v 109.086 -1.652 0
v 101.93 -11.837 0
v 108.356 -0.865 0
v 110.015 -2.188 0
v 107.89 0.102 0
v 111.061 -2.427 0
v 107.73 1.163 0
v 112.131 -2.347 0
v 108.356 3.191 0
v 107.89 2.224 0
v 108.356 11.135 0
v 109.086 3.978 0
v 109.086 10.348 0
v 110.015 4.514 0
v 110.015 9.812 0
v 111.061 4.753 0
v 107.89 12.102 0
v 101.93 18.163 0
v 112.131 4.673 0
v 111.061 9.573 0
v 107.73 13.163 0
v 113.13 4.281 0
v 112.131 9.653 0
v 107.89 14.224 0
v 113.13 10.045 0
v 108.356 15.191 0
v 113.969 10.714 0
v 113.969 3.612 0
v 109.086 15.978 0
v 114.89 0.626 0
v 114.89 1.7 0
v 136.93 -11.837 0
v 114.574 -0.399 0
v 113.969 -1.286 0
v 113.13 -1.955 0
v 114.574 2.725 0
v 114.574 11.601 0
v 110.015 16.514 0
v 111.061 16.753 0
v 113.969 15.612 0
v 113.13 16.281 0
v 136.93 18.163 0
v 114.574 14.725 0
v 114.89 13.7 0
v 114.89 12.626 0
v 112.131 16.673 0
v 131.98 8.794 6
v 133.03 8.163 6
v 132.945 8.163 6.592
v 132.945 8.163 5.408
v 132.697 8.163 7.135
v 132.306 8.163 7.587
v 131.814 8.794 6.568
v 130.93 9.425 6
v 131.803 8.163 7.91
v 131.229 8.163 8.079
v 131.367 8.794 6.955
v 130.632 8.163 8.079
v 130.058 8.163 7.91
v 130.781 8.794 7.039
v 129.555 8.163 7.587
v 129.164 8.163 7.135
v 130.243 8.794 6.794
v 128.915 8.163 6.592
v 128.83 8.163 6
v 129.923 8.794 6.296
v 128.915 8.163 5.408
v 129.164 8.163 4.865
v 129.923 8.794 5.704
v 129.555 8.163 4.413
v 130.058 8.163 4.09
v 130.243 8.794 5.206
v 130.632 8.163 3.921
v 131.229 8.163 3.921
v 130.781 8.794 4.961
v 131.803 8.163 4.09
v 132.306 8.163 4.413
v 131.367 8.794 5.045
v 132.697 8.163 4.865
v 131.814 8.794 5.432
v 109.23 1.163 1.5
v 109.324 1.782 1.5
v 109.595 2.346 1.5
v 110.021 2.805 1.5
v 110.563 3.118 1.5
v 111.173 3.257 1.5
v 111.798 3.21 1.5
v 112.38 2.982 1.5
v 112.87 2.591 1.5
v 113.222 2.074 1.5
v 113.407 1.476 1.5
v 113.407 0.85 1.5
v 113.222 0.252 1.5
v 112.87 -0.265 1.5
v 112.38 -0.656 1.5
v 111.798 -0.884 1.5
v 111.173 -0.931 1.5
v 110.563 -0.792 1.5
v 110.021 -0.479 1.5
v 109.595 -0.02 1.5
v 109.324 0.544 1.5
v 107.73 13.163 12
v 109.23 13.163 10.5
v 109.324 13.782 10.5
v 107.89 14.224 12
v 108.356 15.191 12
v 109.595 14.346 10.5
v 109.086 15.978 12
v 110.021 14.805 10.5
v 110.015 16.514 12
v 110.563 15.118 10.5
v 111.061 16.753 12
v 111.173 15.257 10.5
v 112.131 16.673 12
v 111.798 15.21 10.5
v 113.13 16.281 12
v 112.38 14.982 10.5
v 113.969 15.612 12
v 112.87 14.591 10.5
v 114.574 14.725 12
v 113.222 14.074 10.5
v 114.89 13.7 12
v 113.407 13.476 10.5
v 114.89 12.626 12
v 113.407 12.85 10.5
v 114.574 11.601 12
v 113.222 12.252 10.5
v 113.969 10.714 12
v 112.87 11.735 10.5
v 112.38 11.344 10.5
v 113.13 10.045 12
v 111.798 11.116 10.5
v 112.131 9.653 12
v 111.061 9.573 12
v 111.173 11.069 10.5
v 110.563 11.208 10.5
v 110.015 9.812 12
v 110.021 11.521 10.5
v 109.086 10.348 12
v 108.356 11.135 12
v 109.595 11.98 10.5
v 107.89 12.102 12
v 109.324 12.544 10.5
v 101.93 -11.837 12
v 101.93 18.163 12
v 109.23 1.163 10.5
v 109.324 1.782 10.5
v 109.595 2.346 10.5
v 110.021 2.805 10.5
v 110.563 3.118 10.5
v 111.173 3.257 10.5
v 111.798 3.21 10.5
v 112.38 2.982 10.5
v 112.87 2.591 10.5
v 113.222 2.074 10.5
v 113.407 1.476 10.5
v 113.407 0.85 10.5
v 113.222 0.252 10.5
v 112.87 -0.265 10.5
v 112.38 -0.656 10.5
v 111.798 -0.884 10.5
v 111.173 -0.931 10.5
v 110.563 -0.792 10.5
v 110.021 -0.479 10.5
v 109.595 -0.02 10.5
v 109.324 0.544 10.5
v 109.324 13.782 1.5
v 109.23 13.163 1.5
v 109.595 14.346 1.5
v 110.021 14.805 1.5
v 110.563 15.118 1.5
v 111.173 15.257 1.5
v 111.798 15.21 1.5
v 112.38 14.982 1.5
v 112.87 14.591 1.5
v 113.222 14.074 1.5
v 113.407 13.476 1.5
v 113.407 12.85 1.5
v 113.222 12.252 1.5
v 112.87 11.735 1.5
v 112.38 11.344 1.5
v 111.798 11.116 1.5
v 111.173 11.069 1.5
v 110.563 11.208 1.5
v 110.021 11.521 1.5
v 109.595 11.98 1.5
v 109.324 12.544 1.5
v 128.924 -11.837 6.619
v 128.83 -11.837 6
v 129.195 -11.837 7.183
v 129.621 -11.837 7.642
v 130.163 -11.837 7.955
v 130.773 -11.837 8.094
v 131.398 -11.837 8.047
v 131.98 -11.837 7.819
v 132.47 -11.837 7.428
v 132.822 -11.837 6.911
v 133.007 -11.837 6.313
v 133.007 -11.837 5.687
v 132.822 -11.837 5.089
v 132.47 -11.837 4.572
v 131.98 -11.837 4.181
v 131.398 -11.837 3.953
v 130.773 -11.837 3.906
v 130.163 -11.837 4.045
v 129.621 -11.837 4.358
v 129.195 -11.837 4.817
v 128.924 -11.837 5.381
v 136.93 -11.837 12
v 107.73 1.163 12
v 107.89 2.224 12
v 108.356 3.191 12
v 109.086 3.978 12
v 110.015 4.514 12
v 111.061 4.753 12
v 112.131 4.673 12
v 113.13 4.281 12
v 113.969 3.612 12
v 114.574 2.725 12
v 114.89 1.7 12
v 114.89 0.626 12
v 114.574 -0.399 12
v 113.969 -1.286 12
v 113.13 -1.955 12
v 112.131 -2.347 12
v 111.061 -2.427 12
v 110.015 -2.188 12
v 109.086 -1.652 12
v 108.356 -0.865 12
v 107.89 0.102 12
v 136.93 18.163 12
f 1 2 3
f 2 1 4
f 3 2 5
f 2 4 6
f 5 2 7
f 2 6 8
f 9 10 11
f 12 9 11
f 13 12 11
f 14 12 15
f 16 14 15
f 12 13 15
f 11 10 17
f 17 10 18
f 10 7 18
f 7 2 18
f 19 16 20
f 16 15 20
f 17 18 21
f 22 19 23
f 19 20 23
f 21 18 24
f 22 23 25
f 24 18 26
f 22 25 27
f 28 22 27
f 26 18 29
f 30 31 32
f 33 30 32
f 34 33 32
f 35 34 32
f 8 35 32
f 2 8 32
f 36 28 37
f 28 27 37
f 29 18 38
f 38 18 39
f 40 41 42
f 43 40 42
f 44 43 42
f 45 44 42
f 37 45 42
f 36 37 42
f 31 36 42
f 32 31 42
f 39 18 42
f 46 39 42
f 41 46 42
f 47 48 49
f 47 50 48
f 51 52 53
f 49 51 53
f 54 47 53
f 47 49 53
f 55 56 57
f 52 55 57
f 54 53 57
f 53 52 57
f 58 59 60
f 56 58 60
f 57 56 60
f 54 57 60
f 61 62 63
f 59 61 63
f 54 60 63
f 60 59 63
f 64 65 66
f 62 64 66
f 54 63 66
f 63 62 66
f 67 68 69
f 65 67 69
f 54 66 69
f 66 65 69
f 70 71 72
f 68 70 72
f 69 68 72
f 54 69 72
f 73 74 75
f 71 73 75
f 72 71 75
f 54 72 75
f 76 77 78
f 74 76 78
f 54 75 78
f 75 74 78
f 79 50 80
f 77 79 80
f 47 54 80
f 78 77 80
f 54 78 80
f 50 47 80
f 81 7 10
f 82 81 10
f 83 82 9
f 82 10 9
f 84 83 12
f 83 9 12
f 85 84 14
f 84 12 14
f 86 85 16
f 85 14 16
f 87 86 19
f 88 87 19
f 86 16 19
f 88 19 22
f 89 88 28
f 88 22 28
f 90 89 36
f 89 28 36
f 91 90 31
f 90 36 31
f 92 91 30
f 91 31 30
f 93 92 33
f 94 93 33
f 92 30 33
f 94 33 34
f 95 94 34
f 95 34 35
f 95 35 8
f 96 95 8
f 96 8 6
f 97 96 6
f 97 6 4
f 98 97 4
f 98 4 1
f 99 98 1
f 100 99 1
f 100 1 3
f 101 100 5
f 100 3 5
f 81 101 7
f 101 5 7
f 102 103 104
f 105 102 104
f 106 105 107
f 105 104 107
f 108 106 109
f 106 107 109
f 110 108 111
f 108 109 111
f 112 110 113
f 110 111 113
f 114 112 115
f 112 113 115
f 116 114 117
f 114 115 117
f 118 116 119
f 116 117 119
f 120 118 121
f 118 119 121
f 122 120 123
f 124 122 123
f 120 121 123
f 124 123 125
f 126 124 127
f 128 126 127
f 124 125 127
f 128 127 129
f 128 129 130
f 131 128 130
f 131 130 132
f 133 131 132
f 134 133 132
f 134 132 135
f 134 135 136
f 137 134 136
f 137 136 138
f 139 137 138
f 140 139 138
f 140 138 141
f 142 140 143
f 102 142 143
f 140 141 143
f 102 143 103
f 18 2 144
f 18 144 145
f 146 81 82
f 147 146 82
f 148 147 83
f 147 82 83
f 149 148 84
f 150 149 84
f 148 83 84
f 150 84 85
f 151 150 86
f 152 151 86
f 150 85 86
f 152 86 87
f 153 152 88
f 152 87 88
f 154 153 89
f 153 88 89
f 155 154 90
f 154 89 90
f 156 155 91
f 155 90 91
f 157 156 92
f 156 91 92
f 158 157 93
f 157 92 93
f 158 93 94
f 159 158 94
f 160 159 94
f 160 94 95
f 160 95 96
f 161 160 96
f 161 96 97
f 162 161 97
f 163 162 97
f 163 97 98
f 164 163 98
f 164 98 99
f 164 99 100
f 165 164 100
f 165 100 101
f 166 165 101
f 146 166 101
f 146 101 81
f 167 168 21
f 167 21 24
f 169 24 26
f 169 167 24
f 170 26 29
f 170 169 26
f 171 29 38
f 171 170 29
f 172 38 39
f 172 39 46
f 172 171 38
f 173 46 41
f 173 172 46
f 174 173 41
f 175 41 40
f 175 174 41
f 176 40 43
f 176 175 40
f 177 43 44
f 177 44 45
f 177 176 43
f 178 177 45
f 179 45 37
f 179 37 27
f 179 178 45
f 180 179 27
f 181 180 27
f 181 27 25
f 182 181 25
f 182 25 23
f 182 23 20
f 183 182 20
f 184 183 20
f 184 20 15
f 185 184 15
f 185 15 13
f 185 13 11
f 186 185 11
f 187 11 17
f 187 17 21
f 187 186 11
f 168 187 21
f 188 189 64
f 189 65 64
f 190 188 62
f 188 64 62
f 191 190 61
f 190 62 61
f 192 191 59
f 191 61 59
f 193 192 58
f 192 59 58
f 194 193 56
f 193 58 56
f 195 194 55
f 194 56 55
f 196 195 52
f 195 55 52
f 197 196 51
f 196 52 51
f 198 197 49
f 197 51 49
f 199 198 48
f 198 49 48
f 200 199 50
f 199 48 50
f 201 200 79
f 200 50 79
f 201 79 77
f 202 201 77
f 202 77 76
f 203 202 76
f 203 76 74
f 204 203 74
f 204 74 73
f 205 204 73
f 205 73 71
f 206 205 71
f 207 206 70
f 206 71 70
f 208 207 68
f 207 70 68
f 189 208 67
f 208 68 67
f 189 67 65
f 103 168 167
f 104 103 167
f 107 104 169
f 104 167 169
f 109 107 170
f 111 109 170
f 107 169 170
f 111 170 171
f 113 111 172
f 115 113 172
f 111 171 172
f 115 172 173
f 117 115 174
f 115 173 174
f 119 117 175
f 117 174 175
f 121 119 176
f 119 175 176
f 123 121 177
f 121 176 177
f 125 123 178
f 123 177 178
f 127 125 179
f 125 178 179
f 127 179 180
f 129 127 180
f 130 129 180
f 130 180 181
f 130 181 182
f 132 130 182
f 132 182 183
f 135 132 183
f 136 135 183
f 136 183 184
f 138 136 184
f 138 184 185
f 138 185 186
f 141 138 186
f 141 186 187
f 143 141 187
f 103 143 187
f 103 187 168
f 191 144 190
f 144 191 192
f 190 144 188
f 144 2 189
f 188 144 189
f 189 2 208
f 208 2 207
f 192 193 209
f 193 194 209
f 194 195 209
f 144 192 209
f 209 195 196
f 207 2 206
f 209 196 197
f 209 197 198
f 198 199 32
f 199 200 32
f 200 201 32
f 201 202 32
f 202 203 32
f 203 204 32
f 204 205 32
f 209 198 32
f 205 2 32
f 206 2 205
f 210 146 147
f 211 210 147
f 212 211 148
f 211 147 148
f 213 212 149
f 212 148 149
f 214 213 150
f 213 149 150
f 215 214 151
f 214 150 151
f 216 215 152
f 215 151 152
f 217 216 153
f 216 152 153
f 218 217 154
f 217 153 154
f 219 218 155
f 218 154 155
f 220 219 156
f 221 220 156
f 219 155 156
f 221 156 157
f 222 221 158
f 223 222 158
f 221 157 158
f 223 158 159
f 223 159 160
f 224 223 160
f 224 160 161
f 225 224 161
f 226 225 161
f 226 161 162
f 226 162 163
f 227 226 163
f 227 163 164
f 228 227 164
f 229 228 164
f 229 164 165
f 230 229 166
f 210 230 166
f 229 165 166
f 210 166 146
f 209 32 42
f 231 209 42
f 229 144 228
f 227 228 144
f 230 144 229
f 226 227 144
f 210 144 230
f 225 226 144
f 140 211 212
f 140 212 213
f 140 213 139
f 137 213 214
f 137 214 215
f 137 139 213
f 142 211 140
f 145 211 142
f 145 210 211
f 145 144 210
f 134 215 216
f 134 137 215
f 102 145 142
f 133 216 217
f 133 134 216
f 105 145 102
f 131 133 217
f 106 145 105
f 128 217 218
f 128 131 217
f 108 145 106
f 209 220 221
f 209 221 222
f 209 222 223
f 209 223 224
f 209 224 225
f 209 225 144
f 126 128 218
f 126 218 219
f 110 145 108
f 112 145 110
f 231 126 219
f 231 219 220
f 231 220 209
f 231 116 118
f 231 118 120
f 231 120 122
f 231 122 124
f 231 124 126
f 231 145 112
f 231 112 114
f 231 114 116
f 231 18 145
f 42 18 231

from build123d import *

# Parameters (mm, degrees)
ESBO_O2_W                                    = 35
ESBO_O2_H                                    = 30
RESSALTO_EXTRUS_O1_DEPTH                     = 12
BROCA_DE_ROSQUEAR_PARA_TARRAXA_DE_M5X0_8_D   = 4.2
BROCA_DE_ROSQUEAR_PARA_TARRAXA_DE_M5_2_D     = 4.2
BROCA_DE_ROSQUEAR_PARA_TARRAXA_DE_M5_2_DEPTH = 20
BROCA_DE_ROSQUEAR_PARA_TARRAXA_DE_M5_2_TIP   = 1.2618073
CHANFRO1_SIZE                                = 1.5
CHANFRO2_SIZE                                = 1.5
CHANFRO3_SIZE                                = 1.5


with BuildPart() as part:
    # Esboço2 → Ressalto-extrusão1 (new body)
    with BuildSketch(Plane.XY):
        with Locations((119.430382681, 3.163019551)):
            Rectangle(ESBO_O2_W, ESBO_O2_H)
    extrude(amount=RESSALTO_EXTRUS_O1_DEPTH)

    # Broca de rosquear para tarraxa de M5x0.8 (through all)
    with Locations(Plane.XY.offset(12)):
        with Locations((111.330382681, 13.163019551), (111.330382681, 1.163019551)):
            Hole(BROCA_DE_ROSQUEAR_PARA_TARRAXA_DE_M5X0_8_D / 2)

    # Broca de rosquear para tarraxa de M5 2
    with Locations(Plane.XZ.offset(11.836980449)):
        with Locations((130.930382681, 6)):
            Hole(BROCA_DE_ROSQUEAR_PARA_TARRAXA_DE_M5_2_D / 2, depth=BROCA_DE_ROSQUEAR_PARA_TARRAXA_DE_M5_2_DEPTH)
            with Locations((0, 0, -(BROCA_DE_ROSQUEAR_PARA_TARRAXA_DE_M5_2_DEPTH + BROCA_DE_ROSQUEAR_PARA_TARRAXA_DE_M5_2_TIP / 2))):  # 118° drill point
                Cone(0, BROCA_DE_ROSQUEAR_PARA_TARRAXA_DE_M5_2_D / 2, BROCA_DE_ROSQUEAR_PARA_TARRAXA_DE_M5_2_TIP, mode=Mode.SUBTRACT)

    # Chanfro1
    chanfro1_edges = [part.edges().sort_by_distance(p)[0] for p in [
        (113.430382681, 1.163019551, 12),
        (113.430382681, 13.163019551, 12),
    ]]
    chamfer(chanfro1_edges, length=CHANFRO1_SIZE)

    # Chanfro2
    chanfro2_edges = [part.edges().sort_by_distance(p)[0] for p in [
        (113.430382681, 1.163019551, 0),
    ]]
    chamfer(chanfro2_edges, length=CHANFRO2_SIZE)

    # Chanfro3
    chanfro3_edges = [part.edges().sort_by_distance(p)[0] for p in [
        (113.430382681, 13.163019551, 0),
    ]]
    chamfer(chanfro3_edges, length=CHANFRO3_SIZE)


solid = part.part
